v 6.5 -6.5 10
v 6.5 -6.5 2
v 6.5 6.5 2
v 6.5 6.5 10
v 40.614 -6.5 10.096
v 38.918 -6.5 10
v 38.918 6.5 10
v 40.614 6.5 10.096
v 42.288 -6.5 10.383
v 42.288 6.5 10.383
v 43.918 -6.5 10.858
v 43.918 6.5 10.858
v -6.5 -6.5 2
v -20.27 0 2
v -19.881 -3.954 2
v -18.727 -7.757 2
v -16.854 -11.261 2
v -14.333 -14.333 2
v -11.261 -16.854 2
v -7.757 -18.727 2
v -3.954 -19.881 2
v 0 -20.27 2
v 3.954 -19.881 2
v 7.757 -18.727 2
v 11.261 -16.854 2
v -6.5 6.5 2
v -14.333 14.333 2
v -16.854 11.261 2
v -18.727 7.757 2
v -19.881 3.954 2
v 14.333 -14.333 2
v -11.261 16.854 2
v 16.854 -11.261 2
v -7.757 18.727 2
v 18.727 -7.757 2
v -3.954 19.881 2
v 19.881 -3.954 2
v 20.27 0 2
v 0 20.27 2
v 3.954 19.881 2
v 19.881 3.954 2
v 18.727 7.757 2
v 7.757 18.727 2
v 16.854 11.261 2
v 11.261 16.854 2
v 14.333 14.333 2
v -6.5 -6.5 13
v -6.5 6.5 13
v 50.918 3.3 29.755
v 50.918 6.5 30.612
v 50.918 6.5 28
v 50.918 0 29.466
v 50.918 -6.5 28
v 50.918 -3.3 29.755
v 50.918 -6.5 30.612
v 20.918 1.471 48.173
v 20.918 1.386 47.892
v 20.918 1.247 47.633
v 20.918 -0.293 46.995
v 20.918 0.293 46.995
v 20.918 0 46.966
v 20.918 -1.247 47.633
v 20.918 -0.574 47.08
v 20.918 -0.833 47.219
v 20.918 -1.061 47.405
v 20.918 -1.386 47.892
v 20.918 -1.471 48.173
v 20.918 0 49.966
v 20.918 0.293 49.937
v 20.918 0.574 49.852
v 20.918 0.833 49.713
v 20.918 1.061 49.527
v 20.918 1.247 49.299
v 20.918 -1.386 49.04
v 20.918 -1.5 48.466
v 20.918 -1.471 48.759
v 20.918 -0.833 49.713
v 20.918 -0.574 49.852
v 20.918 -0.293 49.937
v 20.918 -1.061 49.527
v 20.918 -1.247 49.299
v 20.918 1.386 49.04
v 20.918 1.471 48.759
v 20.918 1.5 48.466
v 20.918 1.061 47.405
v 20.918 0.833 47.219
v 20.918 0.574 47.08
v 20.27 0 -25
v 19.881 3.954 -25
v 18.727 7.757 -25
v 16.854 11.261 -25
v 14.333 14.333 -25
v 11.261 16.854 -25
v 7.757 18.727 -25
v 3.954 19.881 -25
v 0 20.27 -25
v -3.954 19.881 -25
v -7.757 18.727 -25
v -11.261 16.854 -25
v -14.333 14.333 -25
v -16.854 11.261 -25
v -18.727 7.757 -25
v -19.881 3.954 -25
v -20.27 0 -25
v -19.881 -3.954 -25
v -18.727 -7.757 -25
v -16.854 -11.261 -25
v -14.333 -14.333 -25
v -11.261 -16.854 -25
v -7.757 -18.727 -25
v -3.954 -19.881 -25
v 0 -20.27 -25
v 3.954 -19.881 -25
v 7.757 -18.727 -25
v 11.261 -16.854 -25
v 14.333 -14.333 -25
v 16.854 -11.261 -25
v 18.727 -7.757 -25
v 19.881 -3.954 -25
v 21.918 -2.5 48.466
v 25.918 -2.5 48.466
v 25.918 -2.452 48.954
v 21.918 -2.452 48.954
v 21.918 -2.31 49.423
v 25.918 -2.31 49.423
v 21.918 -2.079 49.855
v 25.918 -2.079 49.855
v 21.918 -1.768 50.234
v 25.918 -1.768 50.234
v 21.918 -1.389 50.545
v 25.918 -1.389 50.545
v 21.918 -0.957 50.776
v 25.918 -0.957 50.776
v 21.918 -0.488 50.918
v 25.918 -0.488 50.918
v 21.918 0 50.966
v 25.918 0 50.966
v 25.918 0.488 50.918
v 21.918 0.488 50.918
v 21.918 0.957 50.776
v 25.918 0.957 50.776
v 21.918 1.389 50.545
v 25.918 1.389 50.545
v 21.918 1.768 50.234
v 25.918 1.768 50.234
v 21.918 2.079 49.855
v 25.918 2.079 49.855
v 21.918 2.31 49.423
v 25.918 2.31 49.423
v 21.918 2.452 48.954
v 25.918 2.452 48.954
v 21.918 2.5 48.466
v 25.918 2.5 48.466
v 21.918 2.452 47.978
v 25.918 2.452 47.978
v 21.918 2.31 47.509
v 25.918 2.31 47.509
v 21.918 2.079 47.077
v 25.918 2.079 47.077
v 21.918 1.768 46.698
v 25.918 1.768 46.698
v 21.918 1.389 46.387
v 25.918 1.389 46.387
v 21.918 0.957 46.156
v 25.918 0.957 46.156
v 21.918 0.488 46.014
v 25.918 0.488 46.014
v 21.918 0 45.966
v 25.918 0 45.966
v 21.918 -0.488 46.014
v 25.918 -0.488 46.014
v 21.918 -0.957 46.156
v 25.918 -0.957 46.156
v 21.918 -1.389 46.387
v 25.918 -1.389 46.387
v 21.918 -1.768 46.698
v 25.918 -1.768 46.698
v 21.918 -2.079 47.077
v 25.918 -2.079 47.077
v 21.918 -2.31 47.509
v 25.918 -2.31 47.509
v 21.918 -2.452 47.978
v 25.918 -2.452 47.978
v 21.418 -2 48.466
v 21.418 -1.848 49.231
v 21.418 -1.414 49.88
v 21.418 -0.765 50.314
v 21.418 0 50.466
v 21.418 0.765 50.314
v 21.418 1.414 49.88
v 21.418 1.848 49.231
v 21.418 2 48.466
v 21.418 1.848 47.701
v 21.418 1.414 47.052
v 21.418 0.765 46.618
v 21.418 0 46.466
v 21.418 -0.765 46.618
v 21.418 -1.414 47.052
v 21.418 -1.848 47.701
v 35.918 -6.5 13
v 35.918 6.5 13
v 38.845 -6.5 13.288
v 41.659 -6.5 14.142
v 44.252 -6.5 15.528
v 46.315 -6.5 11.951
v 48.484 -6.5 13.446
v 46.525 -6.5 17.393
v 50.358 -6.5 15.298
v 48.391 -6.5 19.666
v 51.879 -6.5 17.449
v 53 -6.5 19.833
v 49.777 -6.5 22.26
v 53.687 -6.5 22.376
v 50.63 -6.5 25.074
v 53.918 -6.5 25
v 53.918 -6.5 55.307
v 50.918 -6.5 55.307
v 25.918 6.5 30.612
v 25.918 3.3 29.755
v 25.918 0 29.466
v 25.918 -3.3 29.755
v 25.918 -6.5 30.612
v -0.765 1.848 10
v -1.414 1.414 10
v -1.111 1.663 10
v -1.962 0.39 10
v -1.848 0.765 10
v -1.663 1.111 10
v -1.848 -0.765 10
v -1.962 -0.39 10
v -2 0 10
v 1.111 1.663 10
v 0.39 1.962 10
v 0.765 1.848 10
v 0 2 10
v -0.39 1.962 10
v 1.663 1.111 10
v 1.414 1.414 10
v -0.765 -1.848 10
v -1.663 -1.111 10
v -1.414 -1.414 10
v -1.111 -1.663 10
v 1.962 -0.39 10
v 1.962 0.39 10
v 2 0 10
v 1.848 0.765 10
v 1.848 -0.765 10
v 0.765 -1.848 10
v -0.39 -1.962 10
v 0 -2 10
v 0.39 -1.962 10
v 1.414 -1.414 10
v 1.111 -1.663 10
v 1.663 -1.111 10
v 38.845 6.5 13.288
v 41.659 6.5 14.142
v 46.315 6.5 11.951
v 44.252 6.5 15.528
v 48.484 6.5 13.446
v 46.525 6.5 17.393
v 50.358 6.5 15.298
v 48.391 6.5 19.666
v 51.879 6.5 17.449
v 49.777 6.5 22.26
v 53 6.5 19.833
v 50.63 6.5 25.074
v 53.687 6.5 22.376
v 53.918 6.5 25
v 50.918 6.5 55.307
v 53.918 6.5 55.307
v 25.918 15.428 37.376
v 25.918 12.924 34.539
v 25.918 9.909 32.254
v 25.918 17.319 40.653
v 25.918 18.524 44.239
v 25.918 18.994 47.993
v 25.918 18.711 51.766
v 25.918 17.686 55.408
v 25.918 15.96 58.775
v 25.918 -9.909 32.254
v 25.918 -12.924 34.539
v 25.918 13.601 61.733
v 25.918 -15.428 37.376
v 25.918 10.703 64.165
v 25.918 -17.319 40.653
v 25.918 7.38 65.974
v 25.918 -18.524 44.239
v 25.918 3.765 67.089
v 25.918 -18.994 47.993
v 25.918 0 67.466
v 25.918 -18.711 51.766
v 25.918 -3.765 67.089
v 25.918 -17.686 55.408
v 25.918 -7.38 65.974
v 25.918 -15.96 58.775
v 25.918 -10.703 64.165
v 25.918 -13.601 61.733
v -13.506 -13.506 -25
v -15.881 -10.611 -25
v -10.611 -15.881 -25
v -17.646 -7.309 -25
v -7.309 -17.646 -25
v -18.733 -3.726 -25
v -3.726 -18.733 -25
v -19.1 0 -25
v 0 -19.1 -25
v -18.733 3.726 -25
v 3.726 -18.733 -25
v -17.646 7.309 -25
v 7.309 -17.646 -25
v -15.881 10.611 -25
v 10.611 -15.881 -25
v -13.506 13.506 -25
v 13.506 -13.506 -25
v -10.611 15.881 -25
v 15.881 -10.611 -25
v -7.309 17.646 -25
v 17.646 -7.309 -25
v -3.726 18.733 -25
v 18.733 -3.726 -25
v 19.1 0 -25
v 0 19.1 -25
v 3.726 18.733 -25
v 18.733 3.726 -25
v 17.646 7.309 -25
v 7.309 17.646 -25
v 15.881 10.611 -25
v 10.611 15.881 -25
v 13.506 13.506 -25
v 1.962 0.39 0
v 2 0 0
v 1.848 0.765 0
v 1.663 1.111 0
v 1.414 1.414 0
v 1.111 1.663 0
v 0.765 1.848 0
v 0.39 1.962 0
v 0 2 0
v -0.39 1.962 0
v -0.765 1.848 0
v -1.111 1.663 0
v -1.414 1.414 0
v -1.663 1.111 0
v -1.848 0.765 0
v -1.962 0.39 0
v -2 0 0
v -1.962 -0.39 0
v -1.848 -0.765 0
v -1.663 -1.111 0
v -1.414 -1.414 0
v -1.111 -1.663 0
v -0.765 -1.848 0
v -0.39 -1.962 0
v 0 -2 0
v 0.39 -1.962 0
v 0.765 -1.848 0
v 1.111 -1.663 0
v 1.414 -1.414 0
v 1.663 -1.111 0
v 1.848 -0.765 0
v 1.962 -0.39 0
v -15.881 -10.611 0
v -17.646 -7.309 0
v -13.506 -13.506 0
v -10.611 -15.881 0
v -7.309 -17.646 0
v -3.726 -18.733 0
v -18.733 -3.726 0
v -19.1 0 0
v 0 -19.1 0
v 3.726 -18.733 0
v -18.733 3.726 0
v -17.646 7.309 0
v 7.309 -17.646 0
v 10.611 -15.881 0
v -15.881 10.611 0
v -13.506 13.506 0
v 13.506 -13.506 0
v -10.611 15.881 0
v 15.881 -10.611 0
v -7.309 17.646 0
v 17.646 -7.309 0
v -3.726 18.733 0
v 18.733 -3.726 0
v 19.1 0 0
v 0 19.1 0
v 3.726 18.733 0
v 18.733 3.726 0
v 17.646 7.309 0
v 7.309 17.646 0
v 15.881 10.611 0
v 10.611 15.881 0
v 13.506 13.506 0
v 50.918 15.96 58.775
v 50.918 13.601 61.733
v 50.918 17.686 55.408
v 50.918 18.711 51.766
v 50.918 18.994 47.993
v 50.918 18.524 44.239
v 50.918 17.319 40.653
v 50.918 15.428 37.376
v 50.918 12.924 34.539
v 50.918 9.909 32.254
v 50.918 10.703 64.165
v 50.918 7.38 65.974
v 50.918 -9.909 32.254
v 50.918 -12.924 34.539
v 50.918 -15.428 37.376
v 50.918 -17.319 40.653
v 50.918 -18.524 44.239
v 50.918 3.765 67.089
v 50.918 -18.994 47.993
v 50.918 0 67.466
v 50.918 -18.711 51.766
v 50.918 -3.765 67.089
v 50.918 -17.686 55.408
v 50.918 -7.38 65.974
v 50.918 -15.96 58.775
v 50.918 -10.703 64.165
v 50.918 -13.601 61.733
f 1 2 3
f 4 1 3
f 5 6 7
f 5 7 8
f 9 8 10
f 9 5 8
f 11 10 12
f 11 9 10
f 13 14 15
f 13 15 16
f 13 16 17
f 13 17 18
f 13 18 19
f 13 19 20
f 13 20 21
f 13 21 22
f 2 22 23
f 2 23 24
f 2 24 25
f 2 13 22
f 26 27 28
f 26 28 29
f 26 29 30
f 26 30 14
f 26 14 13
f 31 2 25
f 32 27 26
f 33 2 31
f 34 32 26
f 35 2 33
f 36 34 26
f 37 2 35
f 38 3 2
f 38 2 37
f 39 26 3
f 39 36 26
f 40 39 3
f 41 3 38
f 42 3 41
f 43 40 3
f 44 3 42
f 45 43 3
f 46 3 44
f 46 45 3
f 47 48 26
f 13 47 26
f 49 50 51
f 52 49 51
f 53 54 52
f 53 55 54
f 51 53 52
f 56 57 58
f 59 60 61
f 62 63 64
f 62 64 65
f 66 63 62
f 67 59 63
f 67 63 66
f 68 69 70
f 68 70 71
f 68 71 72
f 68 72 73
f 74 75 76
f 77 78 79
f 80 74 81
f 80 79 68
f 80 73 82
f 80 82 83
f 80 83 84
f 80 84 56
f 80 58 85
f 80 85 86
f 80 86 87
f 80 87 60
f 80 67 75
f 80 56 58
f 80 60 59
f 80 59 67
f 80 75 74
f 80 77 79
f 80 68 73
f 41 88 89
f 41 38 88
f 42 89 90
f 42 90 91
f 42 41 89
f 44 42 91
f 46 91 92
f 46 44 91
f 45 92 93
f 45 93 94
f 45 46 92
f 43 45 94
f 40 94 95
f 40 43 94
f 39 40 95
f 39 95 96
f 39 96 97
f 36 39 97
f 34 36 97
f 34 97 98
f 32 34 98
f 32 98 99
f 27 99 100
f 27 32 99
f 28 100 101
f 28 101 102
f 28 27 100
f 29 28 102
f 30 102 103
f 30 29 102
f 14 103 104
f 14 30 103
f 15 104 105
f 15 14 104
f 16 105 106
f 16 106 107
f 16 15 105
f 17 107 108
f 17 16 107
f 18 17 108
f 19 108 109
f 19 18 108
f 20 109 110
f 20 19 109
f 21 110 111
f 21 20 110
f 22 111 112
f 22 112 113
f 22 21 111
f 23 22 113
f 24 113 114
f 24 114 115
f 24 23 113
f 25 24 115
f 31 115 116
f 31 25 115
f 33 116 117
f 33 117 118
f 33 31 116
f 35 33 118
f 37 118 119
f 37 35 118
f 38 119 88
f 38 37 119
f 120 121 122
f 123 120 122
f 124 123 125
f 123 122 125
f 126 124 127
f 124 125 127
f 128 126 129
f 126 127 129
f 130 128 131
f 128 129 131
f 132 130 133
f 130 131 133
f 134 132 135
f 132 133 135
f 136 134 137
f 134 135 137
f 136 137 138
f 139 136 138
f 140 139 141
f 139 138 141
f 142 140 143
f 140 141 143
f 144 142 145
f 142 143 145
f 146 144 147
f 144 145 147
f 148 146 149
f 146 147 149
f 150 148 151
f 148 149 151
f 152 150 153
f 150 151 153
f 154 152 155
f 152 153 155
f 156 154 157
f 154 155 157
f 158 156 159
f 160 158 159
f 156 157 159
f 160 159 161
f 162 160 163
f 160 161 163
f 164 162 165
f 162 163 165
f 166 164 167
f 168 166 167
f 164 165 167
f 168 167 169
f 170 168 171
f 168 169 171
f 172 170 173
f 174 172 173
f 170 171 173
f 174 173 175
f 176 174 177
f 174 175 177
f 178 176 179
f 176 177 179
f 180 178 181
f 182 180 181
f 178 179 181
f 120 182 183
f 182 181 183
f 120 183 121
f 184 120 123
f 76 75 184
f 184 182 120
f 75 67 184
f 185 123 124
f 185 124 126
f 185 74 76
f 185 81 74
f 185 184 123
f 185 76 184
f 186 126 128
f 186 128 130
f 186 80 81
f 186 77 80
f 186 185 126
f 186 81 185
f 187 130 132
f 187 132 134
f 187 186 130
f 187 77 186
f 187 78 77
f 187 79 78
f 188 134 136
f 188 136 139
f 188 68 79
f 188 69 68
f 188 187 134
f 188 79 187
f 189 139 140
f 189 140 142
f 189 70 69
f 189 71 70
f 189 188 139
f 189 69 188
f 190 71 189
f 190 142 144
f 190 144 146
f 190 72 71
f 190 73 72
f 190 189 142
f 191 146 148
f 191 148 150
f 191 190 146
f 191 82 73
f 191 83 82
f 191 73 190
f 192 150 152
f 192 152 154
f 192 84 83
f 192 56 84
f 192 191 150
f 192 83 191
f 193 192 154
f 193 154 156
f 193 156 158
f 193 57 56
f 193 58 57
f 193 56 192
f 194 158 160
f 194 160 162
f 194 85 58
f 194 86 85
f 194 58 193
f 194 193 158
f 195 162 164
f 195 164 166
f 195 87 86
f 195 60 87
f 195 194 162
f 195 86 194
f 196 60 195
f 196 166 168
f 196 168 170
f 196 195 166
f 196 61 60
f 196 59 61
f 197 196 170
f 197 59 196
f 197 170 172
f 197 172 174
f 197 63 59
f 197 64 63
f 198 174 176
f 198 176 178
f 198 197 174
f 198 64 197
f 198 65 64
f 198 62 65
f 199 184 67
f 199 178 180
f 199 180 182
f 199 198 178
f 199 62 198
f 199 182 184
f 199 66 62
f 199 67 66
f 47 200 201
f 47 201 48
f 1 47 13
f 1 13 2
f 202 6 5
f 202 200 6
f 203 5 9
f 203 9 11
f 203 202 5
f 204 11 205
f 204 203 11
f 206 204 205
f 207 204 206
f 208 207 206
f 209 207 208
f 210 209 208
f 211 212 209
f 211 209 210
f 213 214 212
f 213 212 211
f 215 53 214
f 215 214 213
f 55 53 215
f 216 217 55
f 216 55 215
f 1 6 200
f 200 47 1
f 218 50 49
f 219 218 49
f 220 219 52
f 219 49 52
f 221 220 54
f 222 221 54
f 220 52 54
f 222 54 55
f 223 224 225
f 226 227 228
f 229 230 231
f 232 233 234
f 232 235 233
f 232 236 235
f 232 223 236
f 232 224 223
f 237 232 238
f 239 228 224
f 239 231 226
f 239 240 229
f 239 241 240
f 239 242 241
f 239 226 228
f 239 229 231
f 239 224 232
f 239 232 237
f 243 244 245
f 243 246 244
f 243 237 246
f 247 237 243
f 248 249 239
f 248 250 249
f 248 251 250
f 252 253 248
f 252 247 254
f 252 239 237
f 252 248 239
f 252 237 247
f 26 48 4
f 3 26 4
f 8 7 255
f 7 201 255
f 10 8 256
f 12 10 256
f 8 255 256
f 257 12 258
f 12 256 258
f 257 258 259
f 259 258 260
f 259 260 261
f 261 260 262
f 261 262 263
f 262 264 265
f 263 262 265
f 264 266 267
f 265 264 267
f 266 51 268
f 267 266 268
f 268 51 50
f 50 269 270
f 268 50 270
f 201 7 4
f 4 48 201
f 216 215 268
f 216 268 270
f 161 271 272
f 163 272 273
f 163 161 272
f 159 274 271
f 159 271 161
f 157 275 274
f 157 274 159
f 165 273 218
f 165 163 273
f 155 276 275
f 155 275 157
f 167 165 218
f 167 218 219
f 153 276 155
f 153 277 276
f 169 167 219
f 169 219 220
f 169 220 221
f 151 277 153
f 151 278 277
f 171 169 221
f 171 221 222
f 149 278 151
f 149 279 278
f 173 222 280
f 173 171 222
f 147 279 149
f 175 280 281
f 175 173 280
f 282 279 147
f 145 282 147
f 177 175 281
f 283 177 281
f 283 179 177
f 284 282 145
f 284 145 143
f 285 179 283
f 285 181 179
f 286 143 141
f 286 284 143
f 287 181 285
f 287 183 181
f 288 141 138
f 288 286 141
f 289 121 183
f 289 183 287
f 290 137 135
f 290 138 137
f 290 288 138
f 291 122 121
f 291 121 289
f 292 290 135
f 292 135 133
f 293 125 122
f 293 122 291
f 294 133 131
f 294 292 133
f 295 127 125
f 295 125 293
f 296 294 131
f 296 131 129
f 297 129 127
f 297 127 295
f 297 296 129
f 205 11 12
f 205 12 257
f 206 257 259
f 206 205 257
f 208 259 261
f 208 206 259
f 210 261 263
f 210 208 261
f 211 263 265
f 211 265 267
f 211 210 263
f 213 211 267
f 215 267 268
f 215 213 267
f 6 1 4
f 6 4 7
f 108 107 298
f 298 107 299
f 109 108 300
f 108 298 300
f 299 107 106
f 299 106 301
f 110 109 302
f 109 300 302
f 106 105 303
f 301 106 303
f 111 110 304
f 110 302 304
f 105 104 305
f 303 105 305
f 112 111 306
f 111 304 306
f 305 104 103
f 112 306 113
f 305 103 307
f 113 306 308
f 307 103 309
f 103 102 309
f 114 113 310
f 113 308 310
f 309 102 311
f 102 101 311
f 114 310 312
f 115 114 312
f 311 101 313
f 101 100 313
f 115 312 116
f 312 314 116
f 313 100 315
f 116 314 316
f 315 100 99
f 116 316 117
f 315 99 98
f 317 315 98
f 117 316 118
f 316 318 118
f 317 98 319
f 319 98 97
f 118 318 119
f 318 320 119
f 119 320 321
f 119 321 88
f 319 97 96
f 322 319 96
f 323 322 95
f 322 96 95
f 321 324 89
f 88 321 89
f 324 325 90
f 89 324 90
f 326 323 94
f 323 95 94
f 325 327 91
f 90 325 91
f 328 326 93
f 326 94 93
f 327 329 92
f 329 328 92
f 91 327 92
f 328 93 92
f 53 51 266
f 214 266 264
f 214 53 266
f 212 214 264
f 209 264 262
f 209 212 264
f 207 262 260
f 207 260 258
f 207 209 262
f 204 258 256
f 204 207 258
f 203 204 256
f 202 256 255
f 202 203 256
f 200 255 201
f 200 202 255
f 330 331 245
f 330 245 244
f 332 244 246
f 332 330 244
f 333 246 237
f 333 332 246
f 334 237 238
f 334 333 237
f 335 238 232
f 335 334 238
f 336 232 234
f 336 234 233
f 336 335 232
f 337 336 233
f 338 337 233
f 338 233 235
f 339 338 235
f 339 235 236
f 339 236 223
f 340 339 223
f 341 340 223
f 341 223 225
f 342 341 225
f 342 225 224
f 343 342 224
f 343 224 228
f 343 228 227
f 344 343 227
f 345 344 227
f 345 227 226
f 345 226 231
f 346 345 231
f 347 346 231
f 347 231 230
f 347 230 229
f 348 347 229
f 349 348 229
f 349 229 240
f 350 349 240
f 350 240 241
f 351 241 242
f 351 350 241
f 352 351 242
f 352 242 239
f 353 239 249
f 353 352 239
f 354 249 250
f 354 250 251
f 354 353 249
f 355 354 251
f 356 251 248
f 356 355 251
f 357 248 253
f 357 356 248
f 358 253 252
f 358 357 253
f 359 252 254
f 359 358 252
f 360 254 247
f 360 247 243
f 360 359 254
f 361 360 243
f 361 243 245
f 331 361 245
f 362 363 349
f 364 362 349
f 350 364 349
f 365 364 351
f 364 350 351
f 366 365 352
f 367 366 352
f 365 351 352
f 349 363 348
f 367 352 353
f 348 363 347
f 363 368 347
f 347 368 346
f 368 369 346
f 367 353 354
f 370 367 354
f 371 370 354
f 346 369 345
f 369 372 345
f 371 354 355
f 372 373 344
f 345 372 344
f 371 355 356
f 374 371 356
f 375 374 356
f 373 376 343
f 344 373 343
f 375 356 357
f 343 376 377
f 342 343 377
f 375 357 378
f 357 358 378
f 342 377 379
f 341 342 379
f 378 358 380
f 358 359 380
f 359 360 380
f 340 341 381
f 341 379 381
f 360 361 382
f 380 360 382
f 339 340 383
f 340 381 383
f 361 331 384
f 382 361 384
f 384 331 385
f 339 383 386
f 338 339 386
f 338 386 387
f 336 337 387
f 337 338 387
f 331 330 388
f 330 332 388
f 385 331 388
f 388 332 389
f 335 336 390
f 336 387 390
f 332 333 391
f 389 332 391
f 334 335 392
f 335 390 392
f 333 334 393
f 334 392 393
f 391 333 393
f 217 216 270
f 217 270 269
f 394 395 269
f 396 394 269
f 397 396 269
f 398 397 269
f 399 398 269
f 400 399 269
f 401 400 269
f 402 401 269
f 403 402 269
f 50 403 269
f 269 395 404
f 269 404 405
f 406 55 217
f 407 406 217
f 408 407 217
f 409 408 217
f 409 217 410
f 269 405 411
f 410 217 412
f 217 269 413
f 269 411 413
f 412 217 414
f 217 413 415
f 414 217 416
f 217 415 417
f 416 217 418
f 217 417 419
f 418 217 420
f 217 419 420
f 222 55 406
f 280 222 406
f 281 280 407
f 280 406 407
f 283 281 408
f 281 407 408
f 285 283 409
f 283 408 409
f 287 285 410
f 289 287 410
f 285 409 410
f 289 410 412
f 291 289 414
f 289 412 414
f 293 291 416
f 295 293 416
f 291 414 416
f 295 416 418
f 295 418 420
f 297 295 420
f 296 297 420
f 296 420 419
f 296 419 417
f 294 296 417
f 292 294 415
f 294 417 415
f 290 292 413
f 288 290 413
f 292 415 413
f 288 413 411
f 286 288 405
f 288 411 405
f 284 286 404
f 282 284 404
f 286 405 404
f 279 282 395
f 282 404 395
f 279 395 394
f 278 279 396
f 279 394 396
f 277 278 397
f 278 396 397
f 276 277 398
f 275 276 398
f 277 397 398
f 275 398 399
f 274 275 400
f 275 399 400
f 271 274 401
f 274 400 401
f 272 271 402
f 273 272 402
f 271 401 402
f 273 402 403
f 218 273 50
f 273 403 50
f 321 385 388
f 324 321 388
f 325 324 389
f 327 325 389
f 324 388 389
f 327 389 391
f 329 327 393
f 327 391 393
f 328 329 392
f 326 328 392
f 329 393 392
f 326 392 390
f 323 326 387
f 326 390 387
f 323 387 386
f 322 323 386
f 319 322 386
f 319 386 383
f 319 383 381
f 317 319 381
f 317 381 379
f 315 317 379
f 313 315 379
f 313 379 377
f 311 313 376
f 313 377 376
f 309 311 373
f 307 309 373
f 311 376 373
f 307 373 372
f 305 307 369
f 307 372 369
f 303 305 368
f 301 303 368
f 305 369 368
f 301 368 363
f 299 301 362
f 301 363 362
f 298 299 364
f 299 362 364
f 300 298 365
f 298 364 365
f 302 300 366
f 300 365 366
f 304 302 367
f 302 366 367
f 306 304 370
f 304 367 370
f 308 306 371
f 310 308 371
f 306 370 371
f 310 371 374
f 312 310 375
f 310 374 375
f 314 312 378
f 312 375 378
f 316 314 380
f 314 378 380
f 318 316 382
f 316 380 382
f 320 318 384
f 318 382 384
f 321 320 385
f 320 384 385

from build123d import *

# Parameters (mm, degrees)
F0_R      = 20.2700767199
F0_R_2    = 19.1
F1_DEPTH  = 25
F0_R_3    = 2
F2_DEPTH  = 2
F4_DEPTH  = 5
F3_W      = 13
F3_H      = 13
F3_R      = 2
F5_DEPTH  = 10
F7_DEPTH  = 13
F8_R      = 19
F9_DEPTH  = 25
F10_R     = 2.5
F11_DEPTH = 5
F12_SIZE  = 1


with BuildPart() as f1:
    # F0 (on Top) → F1 (new body)
    with BuildSketch(Plane.XY):
        Circle(F0_R)
        Circle(F0_R_2, mode=Mode.SUBTRACT)
    extrude(amount=-F1_DEPTH)

    # F0 (on Top) → F2 (join)
    with BuildSketch(Plane.XY):
        Circle(F0_R)
        Circle(F0_R_2, mode=Mode.SUBTRACT)
        Circle(F0_R_2)
        Circle(F0_R_3, mode=Mode.SUBTRACT)
    extrude(amount=F2_DEPTH)

    # F0 (on Top) → F4 (cut)
    with BuildSketch(Plane.XY):
        Circle(F0_R_3)
    extrude(amount=F4_DEPTH, mode=Mode.SUBTRACT)

    # F3 (on face) → F5 (join)
    with BuildSketch(Plane.XY):
        Rectangle(F3_W, F3_H)
        Circle(F3_R, mode=Mode.SUBTRACT)
    extrude(amount=F5_DEPTH)

    # F6 (on face) → F7 (join)
    with BuildSketch(Plane.XZ.offset(6.5)):
        with BuildLine():
            Line((-6.5, 13), (-6.5, 10))
            Line((-6.5, 10), (6.5, 10))
            Line((6.5, 10), (38.9184806049, 10))
            ThreePointArc((38.9184806049, 10), (41.4550102858, 10.2160216052), (43.9184806049, 10.8578643763))
            ThreePointArc((43.9184806049, 10.8578643763), (51.1659293188, 16.3397459622), (53.9184806049, 25))
            Line((53.9184806049, 25), (53.9184806049, 55.3070029616))
            Line((53.9184806049, 55.3070029616), (50.9184806049, 55.3070029616))
            Line((50.9184806049, 55.3070029616), (50.9184806049, 28))
            ThreePointArc((50.9184806049, 28), (46.5250823227, 17.3933982822), (35.9184806049, 13))
            Line((35.9184806049, 13), (-6.5, 13))
        make_face()
    extrude(amount=-F7_DEPTH)

    # F8 (on face) → F9 (join)
    with BuildSketch(Plane(origin=(50.9184806049, 0, 0), x_dir=(0, -1, 0), z_dir=(-1, 0, 0))):
        with Locations((0, 48.4660230577)):
            Circle(F8_R)
        with BuildLine():
            Line((-6.5, 55.3070029616), (-6.5, 30.6124519863))
            ThreePointArc((-6.5, 30.6124519863), (0, 29.4660230577), (6.5, 30.6124519863))
            Line((6.5, 30.6124519863), (6.5, 55.3070029616))
            Line((6.5, 55.3070029616), (-6.5, 55.3070029616))
        make_face()
    extrude(amount=F9_DEPTH)

    # F10 (on face) → F11 (join)
    with BuildSketch(Plane(origin=(25.9184806049, 0, 0), x_dir=(0, -1, 0), z_dir=(-1, 0, 0))):
        with Locations((0, 48.4660230577)):
            Circle(F10_R)
    extrude(amount=F11_DEPTH)

    # F12
    f12_edges = [f1.edges().sort_by_distance(p)[0] for p in [
        (20.918481, 2.5, 48.466023),
    ]]
    chamfer(f12_edges, length=F12_SIZE)


solid = f1.part
